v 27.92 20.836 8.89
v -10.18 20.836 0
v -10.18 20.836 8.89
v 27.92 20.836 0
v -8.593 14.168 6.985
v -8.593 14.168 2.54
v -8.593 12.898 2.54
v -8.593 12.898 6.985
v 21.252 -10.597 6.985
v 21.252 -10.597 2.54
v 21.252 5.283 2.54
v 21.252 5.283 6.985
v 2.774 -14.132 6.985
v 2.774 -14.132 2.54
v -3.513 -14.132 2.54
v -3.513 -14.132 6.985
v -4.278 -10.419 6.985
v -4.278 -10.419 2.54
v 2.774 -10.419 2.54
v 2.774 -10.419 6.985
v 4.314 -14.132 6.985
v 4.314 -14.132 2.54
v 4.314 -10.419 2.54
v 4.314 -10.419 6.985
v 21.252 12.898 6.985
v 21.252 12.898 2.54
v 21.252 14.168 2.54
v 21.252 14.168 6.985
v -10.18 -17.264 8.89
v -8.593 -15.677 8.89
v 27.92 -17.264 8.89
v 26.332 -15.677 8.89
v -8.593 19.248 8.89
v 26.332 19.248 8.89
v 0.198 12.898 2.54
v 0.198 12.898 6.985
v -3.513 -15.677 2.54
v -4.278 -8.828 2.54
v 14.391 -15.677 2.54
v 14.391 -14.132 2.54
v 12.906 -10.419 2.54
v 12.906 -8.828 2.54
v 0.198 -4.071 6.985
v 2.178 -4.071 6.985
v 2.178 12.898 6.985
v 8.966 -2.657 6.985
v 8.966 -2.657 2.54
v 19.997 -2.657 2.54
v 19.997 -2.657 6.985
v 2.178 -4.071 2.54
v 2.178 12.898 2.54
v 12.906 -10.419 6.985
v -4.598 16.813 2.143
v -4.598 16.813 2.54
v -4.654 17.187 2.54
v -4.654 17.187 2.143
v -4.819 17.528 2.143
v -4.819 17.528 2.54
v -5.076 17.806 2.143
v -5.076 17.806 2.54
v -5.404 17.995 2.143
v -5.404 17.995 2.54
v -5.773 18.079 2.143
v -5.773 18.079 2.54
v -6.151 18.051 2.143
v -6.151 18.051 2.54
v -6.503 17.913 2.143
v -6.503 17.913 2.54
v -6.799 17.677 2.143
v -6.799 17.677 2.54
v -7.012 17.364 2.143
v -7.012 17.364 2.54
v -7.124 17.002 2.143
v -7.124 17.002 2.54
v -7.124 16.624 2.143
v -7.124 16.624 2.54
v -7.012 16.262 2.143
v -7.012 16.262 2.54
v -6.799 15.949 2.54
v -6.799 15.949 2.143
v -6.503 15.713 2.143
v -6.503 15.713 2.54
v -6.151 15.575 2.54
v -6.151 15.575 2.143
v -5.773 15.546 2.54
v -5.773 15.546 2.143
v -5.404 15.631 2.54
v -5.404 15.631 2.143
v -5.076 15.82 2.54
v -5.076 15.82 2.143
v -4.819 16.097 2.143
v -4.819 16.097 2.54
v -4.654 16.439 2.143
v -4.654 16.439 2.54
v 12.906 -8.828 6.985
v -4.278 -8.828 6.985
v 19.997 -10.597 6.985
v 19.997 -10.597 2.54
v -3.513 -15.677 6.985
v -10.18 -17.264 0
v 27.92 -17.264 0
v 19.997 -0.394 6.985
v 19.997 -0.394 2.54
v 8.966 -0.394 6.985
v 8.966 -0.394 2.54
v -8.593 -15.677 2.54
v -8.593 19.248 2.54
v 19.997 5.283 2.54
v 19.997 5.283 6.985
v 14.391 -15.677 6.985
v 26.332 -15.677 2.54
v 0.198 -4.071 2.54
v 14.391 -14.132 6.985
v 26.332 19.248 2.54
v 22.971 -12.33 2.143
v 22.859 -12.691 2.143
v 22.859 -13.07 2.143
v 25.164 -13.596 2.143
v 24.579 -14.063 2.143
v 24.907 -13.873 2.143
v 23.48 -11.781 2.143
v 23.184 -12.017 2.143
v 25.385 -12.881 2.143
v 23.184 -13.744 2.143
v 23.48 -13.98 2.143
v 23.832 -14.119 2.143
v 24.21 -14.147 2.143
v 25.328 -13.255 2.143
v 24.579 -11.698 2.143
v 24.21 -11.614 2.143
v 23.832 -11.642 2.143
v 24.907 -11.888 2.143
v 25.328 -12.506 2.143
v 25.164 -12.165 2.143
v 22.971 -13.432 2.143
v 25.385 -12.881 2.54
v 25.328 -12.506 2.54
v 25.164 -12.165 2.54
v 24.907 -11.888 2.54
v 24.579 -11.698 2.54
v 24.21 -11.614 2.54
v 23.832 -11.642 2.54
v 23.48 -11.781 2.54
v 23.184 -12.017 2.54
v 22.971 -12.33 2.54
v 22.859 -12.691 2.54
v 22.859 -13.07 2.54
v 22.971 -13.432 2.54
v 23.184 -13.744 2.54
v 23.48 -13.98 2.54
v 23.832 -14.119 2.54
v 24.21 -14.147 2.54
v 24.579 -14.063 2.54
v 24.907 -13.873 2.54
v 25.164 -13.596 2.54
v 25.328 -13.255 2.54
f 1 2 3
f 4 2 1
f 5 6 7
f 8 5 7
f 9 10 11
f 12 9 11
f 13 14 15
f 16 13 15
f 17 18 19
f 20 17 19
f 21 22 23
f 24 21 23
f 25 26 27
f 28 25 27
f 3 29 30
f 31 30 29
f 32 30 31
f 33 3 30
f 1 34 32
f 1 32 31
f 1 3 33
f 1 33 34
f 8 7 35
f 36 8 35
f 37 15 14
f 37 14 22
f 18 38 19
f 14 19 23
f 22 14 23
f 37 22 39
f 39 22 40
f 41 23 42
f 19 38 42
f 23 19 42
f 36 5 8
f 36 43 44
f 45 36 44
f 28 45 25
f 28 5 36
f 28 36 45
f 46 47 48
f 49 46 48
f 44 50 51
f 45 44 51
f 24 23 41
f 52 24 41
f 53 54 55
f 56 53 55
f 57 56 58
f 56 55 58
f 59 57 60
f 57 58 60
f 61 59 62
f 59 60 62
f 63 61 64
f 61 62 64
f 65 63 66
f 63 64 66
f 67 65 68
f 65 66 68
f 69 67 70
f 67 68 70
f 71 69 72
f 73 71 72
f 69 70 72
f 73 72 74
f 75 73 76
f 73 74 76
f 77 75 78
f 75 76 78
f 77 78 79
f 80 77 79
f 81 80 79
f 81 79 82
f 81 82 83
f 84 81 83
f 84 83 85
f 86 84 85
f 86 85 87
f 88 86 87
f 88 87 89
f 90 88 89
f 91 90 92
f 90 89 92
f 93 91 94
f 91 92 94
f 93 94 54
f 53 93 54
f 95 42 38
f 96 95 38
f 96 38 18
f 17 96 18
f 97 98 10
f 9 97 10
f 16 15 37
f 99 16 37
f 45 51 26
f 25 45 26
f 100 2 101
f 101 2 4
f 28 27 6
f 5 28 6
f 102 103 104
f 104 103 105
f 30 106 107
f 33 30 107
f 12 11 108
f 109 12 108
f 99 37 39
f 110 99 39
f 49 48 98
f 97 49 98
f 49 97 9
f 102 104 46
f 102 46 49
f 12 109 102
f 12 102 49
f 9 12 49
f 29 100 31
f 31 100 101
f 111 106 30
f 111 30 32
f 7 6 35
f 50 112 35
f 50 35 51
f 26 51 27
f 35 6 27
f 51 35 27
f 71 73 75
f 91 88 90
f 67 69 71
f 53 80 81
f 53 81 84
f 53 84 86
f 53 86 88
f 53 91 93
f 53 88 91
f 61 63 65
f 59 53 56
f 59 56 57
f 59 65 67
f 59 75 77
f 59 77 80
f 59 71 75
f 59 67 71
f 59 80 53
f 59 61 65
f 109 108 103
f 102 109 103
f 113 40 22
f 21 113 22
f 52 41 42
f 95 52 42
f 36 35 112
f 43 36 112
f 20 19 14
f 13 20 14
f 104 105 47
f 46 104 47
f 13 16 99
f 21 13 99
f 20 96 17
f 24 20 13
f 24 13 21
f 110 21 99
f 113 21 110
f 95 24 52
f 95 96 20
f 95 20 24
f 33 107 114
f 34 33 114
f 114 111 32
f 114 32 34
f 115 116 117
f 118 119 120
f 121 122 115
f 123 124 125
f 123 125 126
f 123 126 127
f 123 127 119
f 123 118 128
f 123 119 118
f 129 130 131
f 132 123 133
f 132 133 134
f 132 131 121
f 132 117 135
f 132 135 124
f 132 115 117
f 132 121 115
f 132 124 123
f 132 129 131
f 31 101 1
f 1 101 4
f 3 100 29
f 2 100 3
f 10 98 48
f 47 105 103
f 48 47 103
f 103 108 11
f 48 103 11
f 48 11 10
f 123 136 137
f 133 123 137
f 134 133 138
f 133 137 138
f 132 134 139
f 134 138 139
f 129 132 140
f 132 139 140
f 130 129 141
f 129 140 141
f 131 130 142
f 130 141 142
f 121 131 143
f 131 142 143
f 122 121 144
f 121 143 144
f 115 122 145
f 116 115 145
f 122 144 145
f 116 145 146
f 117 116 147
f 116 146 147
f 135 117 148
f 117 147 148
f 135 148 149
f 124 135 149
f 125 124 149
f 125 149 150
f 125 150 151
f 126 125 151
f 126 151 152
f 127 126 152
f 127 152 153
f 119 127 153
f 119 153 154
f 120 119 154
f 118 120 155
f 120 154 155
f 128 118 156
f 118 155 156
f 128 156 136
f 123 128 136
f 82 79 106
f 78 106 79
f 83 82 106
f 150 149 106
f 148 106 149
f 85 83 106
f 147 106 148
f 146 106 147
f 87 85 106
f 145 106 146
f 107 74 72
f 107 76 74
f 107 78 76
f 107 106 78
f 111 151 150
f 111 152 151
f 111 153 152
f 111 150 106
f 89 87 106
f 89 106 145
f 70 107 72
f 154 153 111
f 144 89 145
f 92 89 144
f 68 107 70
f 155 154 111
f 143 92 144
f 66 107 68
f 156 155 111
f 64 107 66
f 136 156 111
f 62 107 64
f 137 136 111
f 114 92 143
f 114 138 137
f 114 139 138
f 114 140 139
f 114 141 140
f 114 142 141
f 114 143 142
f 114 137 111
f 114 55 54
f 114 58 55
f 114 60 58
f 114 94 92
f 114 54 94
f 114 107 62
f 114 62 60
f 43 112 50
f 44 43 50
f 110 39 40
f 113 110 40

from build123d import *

# Parameters (mm, degrees)
F0_W     = 38.1
F0_H     = 38.1
F1_DEPTH = 2.54
F2_W     = 38.1
F2_H     = 38.1
F2_W_2   = 34.925
F2_H_2   = 34.925
F3_DEPTH = 6.35
F5_DEPTH = 4.445
F4_R     = 1.27
F6_DEPTH = 0.396875


with BuildPart() as f1:
    # F0 (on Top) → F1 (new body)
    with BuildSketch(Plane.XY):
        with Locations((8.869877, 1.785933)):
            Rectangle(F0_W, F0_H)
    extrude(amount=F1_DEPTH)

    # F2 (on face) → F3 (join)
    with BuildSketch(Plane.XY.offset(2.54)):
        with Locations((8.869877, 1.785933)):
            Rectangle(F2_W, F2_H)
        with Locations((8.869877, 1.785933)):
            Rectangle(F2_W_2, F2_H_2, mode=Mode.SUBTRACT)
    extrude(amount=F3_DEPTH)

    # F4 (on face) → F6 (cut)
    with BuildSketch(Plane.XY.offset(2.54)):
        with Locations((24.114743, -12.880545)):
            Circle(F4_R)
        with Locations((-5.867907, 16.812883)):
            Circle(F4_R)
    extrude(amount=-F6_DEPTH, mode=Mode.SUBTRACT)


with BuildPart() as f5:
    # F4 (on face) → F5 (new body)
    with BuildSketch(Plane.XY.offset(2.54)):
        Polygon((21.252377, 14.168433), (-8.592623, 14.168433), (-8.592623, 12.898433), (0.198127, 12.898433), (0.198127, -4.071151), (2.178014, -4.071151), (2.178014, 12.898433), (21.252377, 12.898433), align=None)
        Polygon((21.252377, -10.596567), (21.252377, 5.282672), (19.996995, 5.282672), (19.996995, -0.394219), (8.966197, -0.394219), (8.966197, -2.656947), (19.996995, -2.656947), (19.996995, -10.596567), align=None)
        Polygon((-3.512623, -14.131934), (-3.512623, -15.676567), (14.390845, -15.676567), (14.390845, -14.131934), (4.314109, -14.131934), (4.314109, -10.419453), (12.905852, -10.419453), (12.905852, -8.828389), (-4.277635, -8.828389), (-4.277635, -10.419453), (2.773948, -10.419453), (2.773948, -14.131934), align=None)
    extrude(amount=F5_DEPTH)


solid = Compound([f1.part, f5.part])
